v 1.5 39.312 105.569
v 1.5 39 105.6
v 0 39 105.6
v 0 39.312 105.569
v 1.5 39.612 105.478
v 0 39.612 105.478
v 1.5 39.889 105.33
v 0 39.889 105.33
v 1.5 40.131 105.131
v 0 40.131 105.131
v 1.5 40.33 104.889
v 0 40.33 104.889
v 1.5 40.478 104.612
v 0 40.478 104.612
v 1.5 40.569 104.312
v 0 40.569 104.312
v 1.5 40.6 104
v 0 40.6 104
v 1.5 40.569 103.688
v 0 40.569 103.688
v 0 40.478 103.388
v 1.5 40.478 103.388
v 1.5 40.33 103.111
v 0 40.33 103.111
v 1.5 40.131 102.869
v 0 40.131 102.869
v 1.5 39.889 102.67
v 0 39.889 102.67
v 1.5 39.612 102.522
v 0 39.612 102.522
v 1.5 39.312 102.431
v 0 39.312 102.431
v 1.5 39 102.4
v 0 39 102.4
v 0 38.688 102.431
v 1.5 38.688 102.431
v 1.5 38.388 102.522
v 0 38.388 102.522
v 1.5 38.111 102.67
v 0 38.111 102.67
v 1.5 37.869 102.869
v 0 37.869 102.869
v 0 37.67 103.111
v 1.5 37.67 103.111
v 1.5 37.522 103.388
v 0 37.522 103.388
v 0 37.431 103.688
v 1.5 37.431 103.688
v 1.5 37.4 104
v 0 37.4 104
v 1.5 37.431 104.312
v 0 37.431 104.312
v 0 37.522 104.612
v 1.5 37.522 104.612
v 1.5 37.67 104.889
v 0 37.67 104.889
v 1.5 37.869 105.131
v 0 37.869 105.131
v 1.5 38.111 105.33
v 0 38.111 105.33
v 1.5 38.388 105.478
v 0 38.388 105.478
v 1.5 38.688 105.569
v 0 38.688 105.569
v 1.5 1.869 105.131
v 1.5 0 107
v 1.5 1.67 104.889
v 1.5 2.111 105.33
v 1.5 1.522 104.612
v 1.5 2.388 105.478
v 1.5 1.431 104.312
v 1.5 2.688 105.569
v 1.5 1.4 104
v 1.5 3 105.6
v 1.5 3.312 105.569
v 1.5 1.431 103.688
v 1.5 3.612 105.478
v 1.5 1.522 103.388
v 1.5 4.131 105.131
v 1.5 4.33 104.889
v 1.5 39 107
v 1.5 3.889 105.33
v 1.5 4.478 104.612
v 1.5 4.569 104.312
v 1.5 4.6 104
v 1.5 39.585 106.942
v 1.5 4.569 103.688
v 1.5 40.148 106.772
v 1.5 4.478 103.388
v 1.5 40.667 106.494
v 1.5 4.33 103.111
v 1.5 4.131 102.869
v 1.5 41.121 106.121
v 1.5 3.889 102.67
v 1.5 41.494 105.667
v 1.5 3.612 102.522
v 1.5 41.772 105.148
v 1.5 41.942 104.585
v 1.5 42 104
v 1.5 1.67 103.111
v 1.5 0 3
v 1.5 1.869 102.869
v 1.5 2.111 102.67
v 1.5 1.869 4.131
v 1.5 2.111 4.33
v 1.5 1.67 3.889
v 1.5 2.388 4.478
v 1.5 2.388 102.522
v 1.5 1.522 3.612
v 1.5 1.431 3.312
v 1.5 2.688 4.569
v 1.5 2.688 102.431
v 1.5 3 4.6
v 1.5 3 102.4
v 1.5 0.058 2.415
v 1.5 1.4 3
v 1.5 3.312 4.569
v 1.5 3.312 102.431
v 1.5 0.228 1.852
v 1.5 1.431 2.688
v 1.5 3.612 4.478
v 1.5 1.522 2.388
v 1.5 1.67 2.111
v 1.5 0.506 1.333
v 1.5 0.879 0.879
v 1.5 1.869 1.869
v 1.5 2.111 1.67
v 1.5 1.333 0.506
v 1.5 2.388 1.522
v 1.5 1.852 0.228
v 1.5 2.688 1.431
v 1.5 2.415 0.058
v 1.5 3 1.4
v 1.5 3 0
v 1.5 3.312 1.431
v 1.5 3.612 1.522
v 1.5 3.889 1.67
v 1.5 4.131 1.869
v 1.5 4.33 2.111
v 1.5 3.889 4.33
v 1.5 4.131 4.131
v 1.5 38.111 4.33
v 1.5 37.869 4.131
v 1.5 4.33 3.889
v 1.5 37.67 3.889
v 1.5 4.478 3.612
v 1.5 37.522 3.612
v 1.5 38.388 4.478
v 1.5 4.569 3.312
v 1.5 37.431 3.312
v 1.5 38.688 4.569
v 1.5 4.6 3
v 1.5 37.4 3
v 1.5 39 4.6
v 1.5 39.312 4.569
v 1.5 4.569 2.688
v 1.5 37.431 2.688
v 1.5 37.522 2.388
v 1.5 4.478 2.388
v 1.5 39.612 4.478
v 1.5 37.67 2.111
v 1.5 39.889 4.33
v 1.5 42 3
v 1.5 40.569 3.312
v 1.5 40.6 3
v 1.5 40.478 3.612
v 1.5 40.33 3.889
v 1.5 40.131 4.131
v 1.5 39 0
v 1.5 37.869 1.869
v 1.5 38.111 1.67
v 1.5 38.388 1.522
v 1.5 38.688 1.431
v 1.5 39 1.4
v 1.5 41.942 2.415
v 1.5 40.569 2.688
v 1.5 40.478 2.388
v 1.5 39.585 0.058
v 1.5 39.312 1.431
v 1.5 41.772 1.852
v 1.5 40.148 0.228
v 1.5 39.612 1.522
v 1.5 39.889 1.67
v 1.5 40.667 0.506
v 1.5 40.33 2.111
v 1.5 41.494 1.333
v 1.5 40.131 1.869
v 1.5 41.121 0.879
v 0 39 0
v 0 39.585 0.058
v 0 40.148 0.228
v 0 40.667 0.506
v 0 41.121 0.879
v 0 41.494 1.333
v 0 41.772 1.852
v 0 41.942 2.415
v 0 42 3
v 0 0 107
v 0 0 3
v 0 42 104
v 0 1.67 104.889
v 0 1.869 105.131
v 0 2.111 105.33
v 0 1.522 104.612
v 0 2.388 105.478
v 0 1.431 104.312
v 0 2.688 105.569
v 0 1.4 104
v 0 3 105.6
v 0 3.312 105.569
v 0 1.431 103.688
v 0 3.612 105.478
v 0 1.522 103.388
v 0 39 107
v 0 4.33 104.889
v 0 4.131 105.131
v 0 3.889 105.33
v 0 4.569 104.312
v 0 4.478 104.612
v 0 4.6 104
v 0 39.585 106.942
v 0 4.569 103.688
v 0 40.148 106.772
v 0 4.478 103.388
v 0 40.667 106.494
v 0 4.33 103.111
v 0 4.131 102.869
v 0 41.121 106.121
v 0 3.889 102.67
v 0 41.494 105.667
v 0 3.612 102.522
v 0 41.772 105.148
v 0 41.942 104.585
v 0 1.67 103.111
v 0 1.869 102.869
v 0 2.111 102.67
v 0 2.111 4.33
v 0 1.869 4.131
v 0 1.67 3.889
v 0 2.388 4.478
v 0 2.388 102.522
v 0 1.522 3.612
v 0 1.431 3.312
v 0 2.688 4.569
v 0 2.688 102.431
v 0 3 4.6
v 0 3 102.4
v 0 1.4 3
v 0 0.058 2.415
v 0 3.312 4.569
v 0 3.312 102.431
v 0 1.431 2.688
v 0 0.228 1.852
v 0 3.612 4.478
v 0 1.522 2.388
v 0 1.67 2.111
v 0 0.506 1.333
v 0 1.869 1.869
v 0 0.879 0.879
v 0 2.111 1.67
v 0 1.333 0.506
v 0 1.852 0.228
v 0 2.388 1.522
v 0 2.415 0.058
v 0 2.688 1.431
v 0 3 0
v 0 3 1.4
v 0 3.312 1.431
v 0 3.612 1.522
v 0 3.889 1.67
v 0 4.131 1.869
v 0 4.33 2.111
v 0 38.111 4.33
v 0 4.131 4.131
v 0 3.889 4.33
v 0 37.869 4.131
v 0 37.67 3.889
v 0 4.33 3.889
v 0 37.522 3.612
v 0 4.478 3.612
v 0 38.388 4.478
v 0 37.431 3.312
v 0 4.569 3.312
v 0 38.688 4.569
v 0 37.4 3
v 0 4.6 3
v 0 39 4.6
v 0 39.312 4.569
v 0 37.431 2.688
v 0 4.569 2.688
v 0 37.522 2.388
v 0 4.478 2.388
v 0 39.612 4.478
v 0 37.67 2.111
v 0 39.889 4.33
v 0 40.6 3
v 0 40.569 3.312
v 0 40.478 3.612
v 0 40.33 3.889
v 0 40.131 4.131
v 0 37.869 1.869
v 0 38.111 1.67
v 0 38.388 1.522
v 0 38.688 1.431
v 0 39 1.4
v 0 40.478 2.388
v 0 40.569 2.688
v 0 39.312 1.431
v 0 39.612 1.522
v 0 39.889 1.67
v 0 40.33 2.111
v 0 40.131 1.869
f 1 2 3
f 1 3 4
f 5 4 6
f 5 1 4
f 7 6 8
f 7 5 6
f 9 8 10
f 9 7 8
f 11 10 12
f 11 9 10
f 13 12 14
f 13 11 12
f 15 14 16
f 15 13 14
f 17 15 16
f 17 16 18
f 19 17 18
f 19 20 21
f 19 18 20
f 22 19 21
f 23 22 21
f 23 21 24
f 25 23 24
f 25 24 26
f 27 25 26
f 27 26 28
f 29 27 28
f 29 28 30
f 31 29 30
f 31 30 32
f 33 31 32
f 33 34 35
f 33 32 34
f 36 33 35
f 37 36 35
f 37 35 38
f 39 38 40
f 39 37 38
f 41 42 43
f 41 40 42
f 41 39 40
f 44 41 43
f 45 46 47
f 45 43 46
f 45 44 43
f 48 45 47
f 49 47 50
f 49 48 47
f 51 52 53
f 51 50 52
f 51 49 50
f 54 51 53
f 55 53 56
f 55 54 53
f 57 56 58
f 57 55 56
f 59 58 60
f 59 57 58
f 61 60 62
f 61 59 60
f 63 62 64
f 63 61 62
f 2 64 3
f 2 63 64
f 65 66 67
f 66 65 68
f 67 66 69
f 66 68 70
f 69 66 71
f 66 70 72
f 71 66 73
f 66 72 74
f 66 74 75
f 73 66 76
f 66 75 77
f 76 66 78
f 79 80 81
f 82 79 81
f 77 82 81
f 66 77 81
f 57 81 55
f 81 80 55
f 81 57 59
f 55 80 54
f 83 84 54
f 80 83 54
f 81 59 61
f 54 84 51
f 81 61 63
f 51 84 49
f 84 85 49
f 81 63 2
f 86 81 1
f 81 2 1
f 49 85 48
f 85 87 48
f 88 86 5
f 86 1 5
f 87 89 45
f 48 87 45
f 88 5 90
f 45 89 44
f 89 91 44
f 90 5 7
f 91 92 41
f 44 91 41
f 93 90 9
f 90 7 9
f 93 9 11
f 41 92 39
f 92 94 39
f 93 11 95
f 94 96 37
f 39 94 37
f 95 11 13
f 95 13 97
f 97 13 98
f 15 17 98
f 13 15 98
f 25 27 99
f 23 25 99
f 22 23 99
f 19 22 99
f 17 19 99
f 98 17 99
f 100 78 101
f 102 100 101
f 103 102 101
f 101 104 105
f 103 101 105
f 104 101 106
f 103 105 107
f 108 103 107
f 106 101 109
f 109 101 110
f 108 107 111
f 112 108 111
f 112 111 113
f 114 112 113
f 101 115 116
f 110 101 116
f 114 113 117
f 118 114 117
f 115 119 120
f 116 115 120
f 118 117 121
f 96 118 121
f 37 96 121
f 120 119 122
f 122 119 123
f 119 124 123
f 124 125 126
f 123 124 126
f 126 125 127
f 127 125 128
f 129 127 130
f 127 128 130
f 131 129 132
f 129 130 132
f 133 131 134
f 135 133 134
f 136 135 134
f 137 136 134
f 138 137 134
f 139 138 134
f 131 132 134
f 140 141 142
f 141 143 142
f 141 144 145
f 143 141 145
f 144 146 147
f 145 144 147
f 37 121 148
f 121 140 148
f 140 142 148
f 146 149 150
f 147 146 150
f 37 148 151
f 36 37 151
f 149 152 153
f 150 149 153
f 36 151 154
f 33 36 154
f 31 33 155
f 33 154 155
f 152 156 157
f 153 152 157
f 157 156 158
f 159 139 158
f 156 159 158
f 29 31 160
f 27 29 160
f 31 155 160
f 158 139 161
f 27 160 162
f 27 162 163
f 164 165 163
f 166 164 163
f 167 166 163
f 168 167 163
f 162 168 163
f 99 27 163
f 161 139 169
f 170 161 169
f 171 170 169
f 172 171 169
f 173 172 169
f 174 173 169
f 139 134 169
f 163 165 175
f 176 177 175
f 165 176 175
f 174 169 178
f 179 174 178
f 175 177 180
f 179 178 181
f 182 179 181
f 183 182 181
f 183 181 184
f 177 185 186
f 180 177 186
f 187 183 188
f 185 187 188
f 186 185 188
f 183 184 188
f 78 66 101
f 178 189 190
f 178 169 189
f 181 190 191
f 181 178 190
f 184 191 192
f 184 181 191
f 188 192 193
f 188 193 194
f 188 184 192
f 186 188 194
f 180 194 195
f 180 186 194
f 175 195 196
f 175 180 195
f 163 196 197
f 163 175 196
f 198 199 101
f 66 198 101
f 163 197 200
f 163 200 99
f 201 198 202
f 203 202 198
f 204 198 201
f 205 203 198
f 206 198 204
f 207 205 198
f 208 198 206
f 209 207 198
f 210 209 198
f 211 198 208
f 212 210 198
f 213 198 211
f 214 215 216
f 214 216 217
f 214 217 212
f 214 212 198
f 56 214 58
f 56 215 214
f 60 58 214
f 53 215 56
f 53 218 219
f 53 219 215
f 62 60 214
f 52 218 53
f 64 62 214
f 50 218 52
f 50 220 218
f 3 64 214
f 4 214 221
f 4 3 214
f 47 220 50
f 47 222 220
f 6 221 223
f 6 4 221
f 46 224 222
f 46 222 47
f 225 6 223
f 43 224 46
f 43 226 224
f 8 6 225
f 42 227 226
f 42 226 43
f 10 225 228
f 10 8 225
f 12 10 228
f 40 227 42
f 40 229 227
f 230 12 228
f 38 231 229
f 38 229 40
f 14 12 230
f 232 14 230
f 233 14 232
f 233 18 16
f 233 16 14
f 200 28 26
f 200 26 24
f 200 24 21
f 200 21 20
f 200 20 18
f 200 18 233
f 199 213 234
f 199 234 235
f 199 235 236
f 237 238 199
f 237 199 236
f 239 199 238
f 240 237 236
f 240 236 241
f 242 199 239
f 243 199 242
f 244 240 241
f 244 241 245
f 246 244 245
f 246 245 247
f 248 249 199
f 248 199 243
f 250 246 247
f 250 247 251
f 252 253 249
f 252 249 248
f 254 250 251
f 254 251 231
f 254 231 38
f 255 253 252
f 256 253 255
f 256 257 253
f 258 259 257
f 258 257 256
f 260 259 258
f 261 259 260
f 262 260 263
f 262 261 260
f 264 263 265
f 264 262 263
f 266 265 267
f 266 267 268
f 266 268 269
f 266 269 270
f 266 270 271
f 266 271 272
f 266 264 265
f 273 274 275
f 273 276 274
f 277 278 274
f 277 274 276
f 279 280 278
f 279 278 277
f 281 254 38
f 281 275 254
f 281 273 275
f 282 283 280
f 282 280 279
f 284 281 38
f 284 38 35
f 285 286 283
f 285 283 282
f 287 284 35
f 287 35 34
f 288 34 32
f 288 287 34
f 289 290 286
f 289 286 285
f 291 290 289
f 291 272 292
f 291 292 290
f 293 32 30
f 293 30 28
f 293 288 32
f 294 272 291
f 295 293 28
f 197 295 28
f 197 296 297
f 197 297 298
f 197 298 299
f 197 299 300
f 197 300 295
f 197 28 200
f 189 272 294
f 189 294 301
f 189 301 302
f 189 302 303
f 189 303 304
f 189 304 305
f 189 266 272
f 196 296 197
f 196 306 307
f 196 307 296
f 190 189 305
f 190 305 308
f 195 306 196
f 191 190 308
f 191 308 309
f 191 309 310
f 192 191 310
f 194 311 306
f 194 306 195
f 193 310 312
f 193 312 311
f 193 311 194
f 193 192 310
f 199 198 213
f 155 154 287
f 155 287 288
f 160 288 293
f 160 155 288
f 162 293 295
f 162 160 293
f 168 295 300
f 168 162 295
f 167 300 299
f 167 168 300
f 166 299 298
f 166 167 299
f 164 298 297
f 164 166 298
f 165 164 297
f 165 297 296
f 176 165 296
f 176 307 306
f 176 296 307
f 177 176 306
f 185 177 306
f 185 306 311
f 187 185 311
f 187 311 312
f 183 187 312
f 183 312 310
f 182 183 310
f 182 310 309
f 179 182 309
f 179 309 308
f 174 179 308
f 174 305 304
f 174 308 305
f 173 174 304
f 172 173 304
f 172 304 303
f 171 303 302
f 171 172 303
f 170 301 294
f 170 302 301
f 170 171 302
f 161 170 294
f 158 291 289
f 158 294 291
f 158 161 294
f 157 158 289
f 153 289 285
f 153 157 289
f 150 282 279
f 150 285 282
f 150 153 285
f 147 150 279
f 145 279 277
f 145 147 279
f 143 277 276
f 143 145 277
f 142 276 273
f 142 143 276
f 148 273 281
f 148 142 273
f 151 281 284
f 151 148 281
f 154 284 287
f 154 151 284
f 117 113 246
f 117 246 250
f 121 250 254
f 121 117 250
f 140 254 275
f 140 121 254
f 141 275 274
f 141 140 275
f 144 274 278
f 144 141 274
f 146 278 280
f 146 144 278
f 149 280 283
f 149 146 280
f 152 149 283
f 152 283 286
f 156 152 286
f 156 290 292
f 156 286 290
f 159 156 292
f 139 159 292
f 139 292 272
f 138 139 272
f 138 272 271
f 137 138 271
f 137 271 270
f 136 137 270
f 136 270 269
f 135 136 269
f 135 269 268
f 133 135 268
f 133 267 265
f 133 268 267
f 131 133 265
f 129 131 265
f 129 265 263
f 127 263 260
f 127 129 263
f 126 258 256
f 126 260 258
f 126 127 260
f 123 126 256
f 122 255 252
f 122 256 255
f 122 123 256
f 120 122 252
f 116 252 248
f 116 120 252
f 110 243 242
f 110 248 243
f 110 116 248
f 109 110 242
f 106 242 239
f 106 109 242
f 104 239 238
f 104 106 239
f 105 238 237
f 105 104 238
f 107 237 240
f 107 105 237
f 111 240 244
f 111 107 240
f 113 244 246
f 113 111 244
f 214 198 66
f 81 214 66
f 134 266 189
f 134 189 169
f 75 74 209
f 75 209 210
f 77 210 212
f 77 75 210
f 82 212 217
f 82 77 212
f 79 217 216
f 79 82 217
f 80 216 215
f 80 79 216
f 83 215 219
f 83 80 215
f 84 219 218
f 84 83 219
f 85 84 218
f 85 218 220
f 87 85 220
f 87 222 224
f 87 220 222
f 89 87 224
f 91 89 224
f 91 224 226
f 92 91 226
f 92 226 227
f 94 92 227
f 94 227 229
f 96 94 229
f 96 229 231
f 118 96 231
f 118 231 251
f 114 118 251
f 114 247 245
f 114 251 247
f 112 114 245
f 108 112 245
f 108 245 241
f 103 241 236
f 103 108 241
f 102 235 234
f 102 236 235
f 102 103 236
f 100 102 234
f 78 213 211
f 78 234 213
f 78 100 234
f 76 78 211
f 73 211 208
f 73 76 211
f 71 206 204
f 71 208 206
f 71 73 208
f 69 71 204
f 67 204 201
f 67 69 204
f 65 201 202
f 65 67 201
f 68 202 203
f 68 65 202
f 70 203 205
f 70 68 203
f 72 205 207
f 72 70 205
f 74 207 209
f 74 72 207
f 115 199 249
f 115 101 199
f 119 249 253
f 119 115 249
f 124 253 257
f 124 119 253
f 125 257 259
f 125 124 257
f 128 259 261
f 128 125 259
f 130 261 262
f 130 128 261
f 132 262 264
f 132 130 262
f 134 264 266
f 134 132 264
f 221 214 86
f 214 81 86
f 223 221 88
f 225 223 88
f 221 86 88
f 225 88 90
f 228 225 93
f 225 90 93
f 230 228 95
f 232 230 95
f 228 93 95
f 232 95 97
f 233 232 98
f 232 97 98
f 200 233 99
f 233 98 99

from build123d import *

# Parameters (mm, degrees)
CYLINDER099_R     = 1.6
CYLINDER099_DEPTH = 10
CYLINDER100_R     = 1.6
CYLINDER100_DEPTH = 10
CYLINDER101_R     = 1.6
CYLINDER101_DEPTH = 10
CYLINDER098_R     = 1.6
CYLINDER098_DEPTH = 10
BOX094_W          = 1.5
BOX094_H          = 42
BOX094_DEPTH      = 107
FILLET041_R       = 3


with BuildPart() as cylinder099:
    # Cylinder099 → Cylinder099 (new body)
    with BuildSketch(Plane(origin=(5, 39, 3), x_dir=(0, 0, 1), z_dir=(-1, 0, 0))):
        Circle(CYLINDER099_R)
    extrude(amount=CYLINDER099_DEPTH)


with BuildPart() as cylinder100:
    # Cylinder100 → Cylinder100 (new body)
    with BuildSketch(Plane(origin=(5, 3, 104), x_dir=(0, 0, 1), z_dir=(-1, 0, 0))):
        Circle(CYLINDER100_R)
    extrude(amount=CYLINDER100_DEPTH)


with BuildPart() as cylinder101:
    # Cylinder101 → Cylinder101 (new body)
    with BuildSketch(Plane(origin=(5, 39, 104), x_dir=(0, 0, 1), z_dir=(-1, 0, 0))):
        Circle(CYLINDER101_R)
    extrude(amount=CYLINDER101_DEPTH)


with BuildPart() as m3_cyl003:
    # Cylinder098 → Cylinder098 (new body)
    with BuildSketch(Plane(origin=(5, 3, 3), x_dir=(0, 0, 1), z_dir=(-1, 0, 0))):
        Circle(CYLINDER098_R)
    extrude(amount=CYLINDER098_DEPTH)

    # Fusion082: union Cylinder099, Cylinder100, Cylinder101
    add(cylinder099.part)
    add(cylinder100.part)
    add(cylinder101.part)


with BuildPart() as pcb:
    # Box094 → Box094 (new body)
    with BuildSketch(Plane.XY):
        with Locations((0.75, 21)):
            Rectangle(BOX094_W, BOX094_H)
    extrude(amount=BOX094_DEPTH)

    # Cut063: cut m3_cyl003
    add(m3_cyl003.part, mode=Mode.SUBTRACT)

    # Fillet041
    fillet041_edges = [pcb.edges().sort_by_distance(p)[0] for p in [
        (0.75, 0, 0),
        (0.75, 42, 107),
        (0.75, 42, 0),
    ]]
    fillet(fillet041_edges, radius=FILLET041_R)


solid = pcb.part
